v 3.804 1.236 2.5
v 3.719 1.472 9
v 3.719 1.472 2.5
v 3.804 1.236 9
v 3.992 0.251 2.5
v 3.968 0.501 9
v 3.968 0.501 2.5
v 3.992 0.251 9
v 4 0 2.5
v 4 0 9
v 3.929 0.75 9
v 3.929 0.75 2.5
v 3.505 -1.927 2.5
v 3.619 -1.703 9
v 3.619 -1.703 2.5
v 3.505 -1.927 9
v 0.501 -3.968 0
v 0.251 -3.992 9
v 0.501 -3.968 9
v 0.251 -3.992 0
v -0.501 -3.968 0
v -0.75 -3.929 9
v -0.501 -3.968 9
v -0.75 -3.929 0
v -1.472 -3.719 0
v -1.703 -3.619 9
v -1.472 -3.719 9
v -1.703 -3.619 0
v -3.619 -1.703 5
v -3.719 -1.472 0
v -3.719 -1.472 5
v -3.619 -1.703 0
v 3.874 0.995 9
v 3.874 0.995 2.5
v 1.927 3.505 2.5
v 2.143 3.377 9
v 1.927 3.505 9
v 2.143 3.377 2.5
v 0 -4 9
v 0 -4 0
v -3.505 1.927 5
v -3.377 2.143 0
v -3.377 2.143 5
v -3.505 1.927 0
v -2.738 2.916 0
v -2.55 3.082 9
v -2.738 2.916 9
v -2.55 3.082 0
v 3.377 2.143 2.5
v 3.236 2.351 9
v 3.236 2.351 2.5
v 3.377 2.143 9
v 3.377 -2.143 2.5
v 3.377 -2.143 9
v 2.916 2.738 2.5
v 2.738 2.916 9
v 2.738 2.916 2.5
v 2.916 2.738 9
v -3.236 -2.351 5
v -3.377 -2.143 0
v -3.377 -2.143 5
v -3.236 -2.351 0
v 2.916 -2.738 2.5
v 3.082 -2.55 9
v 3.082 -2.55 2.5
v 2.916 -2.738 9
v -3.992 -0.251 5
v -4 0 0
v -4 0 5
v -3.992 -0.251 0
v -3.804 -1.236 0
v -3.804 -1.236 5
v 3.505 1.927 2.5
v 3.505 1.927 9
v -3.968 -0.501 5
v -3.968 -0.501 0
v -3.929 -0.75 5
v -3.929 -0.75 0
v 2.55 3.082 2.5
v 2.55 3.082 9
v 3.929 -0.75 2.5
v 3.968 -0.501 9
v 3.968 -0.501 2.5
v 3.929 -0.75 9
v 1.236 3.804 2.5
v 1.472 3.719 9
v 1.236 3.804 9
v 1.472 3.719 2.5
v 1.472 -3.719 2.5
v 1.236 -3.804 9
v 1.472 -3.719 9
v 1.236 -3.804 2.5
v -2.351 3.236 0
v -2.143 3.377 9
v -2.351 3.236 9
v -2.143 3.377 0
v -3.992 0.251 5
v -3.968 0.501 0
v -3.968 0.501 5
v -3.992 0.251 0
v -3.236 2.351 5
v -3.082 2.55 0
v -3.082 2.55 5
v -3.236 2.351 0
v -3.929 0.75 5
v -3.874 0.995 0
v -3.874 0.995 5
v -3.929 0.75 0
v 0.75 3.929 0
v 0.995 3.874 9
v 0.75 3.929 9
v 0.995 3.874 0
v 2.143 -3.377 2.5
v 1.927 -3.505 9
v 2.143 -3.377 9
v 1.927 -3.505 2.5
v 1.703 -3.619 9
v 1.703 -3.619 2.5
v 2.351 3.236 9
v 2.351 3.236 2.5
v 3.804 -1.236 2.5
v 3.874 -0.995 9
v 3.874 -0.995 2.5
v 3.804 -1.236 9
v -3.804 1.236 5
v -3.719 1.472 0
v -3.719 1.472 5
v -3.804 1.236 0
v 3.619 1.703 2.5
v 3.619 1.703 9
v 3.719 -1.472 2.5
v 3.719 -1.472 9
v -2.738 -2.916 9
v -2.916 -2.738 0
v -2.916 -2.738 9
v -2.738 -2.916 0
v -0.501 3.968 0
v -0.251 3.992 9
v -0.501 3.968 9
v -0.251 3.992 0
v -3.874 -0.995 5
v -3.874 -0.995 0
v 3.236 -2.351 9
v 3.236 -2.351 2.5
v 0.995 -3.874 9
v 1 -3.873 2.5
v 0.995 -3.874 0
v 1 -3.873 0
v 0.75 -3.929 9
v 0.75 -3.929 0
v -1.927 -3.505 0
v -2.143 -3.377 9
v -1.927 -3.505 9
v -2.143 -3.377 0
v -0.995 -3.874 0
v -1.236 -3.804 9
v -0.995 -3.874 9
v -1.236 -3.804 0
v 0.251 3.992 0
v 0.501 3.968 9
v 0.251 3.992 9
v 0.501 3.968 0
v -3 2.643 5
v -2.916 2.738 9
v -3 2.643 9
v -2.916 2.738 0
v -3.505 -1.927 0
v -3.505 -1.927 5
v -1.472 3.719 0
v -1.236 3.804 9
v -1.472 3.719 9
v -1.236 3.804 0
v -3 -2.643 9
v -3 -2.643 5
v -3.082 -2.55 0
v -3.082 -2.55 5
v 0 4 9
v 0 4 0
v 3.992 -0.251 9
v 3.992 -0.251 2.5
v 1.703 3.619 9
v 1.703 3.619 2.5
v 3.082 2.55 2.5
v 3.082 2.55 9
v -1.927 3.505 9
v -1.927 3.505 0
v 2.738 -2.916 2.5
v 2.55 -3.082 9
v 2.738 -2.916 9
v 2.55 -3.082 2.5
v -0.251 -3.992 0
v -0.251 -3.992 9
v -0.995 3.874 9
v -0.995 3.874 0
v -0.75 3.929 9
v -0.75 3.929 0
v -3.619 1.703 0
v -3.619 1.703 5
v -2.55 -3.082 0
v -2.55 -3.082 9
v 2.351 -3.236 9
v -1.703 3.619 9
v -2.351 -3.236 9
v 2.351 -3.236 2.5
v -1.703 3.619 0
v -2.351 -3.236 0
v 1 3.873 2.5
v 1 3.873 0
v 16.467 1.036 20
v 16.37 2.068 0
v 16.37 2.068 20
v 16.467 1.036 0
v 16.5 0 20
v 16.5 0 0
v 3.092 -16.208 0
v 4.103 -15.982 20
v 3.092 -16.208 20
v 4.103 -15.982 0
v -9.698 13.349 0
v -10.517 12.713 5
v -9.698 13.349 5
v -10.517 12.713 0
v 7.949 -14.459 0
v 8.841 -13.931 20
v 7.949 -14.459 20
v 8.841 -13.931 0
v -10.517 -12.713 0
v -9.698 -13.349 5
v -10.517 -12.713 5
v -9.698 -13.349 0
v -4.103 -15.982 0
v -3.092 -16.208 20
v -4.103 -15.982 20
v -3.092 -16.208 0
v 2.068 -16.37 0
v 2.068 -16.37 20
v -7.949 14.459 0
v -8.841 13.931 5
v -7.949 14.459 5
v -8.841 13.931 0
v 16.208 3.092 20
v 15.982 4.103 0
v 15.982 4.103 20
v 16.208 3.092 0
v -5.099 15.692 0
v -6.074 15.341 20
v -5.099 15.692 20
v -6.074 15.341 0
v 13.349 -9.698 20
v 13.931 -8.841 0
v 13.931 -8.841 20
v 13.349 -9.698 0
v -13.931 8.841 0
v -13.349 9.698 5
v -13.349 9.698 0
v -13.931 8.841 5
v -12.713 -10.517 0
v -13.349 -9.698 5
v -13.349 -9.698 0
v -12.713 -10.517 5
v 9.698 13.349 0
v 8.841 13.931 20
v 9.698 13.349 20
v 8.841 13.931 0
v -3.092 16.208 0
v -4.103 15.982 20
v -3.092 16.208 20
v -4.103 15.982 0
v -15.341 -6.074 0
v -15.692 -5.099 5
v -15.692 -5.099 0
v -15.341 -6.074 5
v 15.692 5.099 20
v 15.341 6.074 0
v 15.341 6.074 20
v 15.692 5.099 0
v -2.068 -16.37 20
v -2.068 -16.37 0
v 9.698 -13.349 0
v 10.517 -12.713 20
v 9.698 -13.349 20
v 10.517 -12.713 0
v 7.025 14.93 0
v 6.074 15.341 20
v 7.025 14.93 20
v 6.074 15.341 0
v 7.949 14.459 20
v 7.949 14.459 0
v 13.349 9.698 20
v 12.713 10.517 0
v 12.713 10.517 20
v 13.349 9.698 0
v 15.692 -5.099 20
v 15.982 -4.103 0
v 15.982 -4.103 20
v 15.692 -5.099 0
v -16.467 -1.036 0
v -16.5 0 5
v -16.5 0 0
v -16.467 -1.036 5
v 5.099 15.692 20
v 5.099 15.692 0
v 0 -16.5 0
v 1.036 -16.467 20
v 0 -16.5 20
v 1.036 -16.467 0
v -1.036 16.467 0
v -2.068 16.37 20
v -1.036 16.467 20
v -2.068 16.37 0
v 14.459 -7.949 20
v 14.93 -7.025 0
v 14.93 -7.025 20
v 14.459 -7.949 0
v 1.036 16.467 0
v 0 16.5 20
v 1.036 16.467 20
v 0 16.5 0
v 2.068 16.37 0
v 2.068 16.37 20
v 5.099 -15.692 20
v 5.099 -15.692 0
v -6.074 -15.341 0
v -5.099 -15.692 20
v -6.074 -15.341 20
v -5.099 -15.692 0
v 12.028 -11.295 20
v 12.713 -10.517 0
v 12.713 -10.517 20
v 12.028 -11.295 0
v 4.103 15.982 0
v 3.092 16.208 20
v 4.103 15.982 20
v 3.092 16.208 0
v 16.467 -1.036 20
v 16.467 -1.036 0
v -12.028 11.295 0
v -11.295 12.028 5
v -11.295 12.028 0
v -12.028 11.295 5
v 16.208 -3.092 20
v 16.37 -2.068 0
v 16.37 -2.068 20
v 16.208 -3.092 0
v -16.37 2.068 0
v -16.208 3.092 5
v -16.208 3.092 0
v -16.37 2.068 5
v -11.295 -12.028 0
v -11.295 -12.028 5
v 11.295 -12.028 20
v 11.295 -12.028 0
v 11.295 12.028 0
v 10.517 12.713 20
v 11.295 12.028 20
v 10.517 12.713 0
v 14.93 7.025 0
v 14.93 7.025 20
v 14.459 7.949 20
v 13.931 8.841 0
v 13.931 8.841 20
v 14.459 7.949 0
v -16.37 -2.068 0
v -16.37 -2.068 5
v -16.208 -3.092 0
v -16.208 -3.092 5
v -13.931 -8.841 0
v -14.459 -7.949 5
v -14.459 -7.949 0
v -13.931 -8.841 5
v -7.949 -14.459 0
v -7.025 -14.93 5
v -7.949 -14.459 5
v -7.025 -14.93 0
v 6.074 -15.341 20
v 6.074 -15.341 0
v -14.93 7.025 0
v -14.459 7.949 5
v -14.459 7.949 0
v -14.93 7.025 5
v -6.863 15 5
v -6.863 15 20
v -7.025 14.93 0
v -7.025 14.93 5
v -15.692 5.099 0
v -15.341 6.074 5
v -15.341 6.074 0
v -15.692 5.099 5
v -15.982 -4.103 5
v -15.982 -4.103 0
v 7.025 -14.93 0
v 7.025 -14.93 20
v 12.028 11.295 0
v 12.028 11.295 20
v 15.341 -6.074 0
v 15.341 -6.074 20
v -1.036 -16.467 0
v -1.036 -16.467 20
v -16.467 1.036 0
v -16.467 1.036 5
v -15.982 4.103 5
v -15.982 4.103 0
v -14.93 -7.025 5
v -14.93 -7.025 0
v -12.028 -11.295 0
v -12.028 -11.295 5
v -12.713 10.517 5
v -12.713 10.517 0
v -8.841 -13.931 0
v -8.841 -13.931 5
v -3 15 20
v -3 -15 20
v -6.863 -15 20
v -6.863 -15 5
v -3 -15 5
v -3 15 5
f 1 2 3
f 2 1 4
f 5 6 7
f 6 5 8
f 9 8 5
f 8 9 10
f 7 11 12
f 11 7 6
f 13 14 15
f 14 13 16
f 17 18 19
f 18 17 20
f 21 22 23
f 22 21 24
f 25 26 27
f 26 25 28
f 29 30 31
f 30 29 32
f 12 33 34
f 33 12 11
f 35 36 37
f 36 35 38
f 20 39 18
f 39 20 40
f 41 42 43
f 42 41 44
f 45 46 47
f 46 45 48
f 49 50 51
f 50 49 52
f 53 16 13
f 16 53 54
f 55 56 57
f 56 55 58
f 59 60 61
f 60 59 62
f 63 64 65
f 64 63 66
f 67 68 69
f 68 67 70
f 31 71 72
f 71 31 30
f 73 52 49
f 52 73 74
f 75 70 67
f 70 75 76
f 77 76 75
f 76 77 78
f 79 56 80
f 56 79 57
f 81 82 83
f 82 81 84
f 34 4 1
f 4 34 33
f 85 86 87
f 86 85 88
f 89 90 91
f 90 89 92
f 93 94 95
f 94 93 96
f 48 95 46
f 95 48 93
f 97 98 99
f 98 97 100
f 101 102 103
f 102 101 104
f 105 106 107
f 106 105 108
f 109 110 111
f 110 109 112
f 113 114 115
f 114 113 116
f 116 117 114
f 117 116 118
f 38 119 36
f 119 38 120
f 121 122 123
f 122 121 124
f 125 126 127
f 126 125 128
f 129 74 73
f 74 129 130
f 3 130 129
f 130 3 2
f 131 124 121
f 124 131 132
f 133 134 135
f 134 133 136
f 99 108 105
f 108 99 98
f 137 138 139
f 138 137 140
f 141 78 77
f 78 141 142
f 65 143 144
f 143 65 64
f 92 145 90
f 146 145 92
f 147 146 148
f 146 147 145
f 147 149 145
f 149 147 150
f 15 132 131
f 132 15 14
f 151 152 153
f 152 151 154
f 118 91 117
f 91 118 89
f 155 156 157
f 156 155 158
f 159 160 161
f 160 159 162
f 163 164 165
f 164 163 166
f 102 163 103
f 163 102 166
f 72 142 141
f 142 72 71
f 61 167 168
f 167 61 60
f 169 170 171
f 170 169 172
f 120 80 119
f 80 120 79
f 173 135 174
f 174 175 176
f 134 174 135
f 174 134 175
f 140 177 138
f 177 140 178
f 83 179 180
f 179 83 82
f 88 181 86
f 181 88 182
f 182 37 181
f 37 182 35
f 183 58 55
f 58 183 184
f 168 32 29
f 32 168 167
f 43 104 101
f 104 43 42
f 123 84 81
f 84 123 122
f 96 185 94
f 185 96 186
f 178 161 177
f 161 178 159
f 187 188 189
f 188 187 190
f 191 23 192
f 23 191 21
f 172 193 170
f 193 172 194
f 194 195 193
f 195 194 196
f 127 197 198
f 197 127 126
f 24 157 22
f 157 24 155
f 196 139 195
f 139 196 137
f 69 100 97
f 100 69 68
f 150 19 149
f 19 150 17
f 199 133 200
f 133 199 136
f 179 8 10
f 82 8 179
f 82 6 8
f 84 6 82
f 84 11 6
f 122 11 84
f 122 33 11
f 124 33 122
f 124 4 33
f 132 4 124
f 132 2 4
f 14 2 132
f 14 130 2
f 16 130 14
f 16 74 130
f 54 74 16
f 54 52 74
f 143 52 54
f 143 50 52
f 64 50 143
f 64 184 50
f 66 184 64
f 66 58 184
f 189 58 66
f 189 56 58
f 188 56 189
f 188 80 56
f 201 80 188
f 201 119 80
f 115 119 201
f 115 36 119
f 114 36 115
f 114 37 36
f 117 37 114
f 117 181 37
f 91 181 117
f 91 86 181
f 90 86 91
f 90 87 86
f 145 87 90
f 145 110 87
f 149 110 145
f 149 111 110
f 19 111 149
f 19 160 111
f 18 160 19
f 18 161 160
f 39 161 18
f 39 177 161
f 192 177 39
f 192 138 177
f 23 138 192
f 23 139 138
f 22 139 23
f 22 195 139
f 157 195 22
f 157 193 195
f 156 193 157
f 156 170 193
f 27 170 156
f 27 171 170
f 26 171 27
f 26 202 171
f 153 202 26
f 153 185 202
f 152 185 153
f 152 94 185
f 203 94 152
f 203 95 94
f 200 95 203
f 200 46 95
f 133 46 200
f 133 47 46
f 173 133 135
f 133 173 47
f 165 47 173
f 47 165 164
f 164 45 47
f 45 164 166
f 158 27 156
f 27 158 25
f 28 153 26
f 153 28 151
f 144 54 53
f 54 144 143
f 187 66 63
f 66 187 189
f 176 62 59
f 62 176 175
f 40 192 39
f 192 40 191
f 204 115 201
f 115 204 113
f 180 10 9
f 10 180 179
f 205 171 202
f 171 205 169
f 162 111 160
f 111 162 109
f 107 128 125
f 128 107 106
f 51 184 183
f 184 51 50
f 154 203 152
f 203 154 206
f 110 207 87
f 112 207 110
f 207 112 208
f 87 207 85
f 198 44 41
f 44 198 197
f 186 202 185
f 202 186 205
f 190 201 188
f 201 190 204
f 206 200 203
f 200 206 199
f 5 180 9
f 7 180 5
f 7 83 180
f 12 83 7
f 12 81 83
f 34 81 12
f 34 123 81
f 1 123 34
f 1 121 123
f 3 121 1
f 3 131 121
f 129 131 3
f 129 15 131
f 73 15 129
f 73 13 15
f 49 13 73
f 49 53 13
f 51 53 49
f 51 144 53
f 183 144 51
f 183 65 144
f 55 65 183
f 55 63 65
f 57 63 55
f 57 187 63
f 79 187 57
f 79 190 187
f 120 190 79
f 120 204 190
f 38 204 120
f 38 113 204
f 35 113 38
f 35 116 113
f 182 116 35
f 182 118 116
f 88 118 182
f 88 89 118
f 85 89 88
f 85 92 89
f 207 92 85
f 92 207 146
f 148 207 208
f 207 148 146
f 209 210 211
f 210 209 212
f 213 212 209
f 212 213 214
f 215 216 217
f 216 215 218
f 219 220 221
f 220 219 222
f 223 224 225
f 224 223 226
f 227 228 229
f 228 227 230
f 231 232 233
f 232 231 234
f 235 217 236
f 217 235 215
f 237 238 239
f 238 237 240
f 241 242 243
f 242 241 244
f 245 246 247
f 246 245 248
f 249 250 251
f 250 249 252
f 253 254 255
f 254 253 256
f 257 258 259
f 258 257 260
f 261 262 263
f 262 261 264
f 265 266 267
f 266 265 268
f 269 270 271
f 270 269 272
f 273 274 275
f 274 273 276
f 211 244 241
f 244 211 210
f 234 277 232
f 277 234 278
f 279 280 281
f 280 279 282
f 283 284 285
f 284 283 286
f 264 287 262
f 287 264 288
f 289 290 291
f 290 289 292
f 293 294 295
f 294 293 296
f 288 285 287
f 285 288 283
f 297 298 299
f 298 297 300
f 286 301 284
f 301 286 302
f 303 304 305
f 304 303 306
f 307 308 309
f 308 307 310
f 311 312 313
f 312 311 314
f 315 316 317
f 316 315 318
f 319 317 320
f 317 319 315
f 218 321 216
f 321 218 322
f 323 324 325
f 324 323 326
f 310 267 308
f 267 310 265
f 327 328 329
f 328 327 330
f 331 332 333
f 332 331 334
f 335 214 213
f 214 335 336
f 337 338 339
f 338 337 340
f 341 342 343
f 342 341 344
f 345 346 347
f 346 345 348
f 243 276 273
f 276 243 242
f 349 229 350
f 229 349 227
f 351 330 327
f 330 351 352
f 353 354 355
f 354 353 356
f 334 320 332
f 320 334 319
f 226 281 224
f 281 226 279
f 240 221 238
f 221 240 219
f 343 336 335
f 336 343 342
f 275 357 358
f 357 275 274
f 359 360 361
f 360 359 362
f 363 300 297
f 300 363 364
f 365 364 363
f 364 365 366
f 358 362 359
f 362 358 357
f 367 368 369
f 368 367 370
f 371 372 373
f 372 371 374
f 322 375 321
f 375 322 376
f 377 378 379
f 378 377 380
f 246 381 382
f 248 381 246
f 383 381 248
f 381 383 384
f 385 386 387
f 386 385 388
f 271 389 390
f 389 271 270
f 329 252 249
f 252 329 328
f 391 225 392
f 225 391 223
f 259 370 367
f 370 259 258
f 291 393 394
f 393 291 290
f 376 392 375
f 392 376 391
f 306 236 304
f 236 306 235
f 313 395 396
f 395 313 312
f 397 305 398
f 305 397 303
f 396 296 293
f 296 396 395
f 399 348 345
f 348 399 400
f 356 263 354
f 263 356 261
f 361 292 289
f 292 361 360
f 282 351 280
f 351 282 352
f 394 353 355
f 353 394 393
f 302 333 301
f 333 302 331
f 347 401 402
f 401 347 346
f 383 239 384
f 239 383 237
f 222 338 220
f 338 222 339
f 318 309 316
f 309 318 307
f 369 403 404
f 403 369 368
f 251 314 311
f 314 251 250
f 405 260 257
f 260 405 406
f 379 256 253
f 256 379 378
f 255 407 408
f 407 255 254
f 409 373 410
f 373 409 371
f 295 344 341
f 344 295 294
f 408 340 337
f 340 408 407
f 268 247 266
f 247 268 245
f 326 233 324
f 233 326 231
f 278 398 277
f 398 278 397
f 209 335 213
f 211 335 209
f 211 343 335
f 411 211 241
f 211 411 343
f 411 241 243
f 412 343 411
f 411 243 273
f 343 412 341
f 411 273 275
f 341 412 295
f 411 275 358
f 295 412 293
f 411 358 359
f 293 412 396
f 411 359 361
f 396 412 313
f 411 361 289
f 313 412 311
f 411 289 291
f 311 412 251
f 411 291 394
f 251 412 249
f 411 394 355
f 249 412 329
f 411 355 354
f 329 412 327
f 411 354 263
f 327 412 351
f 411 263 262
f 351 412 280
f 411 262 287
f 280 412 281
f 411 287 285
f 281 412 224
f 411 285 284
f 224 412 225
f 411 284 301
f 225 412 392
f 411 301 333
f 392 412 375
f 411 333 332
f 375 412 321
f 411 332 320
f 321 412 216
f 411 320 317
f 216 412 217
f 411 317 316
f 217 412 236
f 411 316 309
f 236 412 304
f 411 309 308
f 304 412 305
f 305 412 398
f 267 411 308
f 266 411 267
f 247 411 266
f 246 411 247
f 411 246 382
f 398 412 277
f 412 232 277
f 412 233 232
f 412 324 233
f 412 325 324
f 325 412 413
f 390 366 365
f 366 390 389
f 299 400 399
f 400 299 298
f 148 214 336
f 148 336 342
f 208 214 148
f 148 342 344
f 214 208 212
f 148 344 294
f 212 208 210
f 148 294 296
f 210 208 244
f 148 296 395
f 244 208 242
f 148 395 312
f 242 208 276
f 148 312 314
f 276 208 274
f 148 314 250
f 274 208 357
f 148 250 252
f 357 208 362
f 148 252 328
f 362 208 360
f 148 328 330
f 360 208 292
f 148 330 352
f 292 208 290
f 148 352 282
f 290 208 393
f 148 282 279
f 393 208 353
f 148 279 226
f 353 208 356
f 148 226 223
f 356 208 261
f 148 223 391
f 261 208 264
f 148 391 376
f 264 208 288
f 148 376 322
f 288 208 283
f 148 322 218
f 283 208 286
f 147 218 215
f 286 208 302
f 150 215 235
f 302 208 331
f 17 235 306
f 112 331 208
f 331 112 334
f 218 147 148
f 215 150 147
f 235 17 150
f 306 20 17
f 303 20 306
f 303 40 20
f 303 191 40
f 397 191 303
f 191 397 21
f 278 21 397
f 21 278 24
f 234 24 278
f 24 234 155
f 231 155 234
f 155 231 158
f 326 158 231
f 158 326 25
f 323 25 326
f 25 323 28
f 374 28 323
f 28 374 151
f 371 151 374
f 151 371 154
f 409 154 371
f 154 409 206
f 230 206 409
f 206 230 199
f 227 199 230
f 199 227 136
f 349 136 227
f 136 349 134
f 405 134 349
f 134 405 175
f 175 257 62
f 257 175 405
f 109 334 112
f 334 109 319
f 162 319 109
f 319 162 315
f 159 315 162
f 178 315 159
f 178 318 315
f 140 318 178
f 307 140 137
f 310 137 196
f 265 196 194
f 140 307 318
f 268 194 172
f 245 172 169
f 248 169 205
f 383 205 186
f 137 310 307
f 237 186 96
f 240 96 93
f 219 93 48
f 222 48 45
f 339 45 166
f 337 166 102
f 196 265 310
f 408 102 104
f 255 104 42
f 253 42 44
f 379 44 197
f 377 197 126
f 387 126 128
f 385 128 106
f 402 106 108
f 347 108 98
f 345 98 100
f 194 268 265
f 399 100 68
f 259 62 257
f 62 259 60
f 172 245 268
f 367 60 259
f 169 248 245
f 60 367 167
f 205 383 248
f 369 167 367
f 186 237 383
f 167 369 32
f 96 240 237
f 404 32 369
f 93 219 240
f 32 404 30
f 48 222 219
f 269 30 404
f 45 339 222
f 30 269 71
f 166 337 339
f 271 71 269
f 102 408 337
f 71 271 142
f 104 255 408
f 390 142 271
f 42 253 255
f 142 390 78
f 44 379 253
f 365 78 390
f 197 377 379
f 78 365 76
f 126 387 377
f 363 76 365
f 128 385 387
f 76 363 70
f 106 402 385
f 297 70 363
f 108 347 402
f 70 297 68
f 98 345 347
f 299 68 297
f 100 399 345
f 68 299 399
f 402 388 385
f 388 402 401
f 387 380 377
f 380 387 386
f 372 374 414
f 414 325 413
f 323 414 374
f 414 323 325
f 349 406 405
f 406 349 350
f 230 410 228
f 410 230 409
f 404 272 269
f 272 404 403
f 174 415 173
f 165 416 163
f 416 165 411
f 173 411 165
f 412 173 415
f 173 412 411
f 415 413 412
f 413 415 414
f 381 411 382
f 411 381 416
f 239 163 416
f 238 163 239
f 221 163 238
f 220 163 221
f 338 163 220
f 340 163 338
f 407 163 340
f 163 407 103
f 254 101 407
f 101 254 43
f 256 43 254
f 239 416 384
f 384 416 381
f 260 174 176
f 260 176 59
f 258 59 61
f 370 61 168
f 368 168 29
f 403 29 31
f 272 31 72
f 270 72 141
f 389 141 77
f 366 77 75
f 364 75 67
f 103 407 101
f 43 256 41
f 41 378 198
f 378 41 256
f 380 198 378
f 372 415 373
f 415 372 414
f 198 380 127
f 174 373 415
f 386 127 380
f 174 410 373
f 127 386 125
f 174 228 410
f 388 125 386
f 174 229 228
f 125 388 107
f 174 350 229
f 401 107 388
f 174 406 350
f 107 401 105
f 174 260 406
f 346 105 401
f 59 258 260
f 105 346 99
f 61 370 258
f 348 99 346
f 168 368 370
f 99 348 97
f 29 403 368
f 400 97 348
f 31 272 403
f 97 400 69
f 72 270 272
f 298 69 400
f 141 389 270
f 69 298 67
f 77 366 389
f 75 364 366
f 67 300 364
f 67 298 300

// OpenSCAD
$fn = 100;

peg = [6.8, 4.2, 10];

difference() {
    cylinder(d=33, h = 20);
    difference() {
       translate([0,0,-1]) cylinder(d=8, h=10);
        translate([4.5,0,-1]) cube([7,8,7],center = true);
    }
    //translate([-18,0,20]) rotate([90,0,0]) cylinder(r=15,center=true, h = 40);
    translate([-18,0,20]) rotate([90,0,0]) cube([30,30,30], center=true);
    //translate([18,0,20]) rotate([90,0,0]) cylinder(r=15,center=true, h = 40);
}
